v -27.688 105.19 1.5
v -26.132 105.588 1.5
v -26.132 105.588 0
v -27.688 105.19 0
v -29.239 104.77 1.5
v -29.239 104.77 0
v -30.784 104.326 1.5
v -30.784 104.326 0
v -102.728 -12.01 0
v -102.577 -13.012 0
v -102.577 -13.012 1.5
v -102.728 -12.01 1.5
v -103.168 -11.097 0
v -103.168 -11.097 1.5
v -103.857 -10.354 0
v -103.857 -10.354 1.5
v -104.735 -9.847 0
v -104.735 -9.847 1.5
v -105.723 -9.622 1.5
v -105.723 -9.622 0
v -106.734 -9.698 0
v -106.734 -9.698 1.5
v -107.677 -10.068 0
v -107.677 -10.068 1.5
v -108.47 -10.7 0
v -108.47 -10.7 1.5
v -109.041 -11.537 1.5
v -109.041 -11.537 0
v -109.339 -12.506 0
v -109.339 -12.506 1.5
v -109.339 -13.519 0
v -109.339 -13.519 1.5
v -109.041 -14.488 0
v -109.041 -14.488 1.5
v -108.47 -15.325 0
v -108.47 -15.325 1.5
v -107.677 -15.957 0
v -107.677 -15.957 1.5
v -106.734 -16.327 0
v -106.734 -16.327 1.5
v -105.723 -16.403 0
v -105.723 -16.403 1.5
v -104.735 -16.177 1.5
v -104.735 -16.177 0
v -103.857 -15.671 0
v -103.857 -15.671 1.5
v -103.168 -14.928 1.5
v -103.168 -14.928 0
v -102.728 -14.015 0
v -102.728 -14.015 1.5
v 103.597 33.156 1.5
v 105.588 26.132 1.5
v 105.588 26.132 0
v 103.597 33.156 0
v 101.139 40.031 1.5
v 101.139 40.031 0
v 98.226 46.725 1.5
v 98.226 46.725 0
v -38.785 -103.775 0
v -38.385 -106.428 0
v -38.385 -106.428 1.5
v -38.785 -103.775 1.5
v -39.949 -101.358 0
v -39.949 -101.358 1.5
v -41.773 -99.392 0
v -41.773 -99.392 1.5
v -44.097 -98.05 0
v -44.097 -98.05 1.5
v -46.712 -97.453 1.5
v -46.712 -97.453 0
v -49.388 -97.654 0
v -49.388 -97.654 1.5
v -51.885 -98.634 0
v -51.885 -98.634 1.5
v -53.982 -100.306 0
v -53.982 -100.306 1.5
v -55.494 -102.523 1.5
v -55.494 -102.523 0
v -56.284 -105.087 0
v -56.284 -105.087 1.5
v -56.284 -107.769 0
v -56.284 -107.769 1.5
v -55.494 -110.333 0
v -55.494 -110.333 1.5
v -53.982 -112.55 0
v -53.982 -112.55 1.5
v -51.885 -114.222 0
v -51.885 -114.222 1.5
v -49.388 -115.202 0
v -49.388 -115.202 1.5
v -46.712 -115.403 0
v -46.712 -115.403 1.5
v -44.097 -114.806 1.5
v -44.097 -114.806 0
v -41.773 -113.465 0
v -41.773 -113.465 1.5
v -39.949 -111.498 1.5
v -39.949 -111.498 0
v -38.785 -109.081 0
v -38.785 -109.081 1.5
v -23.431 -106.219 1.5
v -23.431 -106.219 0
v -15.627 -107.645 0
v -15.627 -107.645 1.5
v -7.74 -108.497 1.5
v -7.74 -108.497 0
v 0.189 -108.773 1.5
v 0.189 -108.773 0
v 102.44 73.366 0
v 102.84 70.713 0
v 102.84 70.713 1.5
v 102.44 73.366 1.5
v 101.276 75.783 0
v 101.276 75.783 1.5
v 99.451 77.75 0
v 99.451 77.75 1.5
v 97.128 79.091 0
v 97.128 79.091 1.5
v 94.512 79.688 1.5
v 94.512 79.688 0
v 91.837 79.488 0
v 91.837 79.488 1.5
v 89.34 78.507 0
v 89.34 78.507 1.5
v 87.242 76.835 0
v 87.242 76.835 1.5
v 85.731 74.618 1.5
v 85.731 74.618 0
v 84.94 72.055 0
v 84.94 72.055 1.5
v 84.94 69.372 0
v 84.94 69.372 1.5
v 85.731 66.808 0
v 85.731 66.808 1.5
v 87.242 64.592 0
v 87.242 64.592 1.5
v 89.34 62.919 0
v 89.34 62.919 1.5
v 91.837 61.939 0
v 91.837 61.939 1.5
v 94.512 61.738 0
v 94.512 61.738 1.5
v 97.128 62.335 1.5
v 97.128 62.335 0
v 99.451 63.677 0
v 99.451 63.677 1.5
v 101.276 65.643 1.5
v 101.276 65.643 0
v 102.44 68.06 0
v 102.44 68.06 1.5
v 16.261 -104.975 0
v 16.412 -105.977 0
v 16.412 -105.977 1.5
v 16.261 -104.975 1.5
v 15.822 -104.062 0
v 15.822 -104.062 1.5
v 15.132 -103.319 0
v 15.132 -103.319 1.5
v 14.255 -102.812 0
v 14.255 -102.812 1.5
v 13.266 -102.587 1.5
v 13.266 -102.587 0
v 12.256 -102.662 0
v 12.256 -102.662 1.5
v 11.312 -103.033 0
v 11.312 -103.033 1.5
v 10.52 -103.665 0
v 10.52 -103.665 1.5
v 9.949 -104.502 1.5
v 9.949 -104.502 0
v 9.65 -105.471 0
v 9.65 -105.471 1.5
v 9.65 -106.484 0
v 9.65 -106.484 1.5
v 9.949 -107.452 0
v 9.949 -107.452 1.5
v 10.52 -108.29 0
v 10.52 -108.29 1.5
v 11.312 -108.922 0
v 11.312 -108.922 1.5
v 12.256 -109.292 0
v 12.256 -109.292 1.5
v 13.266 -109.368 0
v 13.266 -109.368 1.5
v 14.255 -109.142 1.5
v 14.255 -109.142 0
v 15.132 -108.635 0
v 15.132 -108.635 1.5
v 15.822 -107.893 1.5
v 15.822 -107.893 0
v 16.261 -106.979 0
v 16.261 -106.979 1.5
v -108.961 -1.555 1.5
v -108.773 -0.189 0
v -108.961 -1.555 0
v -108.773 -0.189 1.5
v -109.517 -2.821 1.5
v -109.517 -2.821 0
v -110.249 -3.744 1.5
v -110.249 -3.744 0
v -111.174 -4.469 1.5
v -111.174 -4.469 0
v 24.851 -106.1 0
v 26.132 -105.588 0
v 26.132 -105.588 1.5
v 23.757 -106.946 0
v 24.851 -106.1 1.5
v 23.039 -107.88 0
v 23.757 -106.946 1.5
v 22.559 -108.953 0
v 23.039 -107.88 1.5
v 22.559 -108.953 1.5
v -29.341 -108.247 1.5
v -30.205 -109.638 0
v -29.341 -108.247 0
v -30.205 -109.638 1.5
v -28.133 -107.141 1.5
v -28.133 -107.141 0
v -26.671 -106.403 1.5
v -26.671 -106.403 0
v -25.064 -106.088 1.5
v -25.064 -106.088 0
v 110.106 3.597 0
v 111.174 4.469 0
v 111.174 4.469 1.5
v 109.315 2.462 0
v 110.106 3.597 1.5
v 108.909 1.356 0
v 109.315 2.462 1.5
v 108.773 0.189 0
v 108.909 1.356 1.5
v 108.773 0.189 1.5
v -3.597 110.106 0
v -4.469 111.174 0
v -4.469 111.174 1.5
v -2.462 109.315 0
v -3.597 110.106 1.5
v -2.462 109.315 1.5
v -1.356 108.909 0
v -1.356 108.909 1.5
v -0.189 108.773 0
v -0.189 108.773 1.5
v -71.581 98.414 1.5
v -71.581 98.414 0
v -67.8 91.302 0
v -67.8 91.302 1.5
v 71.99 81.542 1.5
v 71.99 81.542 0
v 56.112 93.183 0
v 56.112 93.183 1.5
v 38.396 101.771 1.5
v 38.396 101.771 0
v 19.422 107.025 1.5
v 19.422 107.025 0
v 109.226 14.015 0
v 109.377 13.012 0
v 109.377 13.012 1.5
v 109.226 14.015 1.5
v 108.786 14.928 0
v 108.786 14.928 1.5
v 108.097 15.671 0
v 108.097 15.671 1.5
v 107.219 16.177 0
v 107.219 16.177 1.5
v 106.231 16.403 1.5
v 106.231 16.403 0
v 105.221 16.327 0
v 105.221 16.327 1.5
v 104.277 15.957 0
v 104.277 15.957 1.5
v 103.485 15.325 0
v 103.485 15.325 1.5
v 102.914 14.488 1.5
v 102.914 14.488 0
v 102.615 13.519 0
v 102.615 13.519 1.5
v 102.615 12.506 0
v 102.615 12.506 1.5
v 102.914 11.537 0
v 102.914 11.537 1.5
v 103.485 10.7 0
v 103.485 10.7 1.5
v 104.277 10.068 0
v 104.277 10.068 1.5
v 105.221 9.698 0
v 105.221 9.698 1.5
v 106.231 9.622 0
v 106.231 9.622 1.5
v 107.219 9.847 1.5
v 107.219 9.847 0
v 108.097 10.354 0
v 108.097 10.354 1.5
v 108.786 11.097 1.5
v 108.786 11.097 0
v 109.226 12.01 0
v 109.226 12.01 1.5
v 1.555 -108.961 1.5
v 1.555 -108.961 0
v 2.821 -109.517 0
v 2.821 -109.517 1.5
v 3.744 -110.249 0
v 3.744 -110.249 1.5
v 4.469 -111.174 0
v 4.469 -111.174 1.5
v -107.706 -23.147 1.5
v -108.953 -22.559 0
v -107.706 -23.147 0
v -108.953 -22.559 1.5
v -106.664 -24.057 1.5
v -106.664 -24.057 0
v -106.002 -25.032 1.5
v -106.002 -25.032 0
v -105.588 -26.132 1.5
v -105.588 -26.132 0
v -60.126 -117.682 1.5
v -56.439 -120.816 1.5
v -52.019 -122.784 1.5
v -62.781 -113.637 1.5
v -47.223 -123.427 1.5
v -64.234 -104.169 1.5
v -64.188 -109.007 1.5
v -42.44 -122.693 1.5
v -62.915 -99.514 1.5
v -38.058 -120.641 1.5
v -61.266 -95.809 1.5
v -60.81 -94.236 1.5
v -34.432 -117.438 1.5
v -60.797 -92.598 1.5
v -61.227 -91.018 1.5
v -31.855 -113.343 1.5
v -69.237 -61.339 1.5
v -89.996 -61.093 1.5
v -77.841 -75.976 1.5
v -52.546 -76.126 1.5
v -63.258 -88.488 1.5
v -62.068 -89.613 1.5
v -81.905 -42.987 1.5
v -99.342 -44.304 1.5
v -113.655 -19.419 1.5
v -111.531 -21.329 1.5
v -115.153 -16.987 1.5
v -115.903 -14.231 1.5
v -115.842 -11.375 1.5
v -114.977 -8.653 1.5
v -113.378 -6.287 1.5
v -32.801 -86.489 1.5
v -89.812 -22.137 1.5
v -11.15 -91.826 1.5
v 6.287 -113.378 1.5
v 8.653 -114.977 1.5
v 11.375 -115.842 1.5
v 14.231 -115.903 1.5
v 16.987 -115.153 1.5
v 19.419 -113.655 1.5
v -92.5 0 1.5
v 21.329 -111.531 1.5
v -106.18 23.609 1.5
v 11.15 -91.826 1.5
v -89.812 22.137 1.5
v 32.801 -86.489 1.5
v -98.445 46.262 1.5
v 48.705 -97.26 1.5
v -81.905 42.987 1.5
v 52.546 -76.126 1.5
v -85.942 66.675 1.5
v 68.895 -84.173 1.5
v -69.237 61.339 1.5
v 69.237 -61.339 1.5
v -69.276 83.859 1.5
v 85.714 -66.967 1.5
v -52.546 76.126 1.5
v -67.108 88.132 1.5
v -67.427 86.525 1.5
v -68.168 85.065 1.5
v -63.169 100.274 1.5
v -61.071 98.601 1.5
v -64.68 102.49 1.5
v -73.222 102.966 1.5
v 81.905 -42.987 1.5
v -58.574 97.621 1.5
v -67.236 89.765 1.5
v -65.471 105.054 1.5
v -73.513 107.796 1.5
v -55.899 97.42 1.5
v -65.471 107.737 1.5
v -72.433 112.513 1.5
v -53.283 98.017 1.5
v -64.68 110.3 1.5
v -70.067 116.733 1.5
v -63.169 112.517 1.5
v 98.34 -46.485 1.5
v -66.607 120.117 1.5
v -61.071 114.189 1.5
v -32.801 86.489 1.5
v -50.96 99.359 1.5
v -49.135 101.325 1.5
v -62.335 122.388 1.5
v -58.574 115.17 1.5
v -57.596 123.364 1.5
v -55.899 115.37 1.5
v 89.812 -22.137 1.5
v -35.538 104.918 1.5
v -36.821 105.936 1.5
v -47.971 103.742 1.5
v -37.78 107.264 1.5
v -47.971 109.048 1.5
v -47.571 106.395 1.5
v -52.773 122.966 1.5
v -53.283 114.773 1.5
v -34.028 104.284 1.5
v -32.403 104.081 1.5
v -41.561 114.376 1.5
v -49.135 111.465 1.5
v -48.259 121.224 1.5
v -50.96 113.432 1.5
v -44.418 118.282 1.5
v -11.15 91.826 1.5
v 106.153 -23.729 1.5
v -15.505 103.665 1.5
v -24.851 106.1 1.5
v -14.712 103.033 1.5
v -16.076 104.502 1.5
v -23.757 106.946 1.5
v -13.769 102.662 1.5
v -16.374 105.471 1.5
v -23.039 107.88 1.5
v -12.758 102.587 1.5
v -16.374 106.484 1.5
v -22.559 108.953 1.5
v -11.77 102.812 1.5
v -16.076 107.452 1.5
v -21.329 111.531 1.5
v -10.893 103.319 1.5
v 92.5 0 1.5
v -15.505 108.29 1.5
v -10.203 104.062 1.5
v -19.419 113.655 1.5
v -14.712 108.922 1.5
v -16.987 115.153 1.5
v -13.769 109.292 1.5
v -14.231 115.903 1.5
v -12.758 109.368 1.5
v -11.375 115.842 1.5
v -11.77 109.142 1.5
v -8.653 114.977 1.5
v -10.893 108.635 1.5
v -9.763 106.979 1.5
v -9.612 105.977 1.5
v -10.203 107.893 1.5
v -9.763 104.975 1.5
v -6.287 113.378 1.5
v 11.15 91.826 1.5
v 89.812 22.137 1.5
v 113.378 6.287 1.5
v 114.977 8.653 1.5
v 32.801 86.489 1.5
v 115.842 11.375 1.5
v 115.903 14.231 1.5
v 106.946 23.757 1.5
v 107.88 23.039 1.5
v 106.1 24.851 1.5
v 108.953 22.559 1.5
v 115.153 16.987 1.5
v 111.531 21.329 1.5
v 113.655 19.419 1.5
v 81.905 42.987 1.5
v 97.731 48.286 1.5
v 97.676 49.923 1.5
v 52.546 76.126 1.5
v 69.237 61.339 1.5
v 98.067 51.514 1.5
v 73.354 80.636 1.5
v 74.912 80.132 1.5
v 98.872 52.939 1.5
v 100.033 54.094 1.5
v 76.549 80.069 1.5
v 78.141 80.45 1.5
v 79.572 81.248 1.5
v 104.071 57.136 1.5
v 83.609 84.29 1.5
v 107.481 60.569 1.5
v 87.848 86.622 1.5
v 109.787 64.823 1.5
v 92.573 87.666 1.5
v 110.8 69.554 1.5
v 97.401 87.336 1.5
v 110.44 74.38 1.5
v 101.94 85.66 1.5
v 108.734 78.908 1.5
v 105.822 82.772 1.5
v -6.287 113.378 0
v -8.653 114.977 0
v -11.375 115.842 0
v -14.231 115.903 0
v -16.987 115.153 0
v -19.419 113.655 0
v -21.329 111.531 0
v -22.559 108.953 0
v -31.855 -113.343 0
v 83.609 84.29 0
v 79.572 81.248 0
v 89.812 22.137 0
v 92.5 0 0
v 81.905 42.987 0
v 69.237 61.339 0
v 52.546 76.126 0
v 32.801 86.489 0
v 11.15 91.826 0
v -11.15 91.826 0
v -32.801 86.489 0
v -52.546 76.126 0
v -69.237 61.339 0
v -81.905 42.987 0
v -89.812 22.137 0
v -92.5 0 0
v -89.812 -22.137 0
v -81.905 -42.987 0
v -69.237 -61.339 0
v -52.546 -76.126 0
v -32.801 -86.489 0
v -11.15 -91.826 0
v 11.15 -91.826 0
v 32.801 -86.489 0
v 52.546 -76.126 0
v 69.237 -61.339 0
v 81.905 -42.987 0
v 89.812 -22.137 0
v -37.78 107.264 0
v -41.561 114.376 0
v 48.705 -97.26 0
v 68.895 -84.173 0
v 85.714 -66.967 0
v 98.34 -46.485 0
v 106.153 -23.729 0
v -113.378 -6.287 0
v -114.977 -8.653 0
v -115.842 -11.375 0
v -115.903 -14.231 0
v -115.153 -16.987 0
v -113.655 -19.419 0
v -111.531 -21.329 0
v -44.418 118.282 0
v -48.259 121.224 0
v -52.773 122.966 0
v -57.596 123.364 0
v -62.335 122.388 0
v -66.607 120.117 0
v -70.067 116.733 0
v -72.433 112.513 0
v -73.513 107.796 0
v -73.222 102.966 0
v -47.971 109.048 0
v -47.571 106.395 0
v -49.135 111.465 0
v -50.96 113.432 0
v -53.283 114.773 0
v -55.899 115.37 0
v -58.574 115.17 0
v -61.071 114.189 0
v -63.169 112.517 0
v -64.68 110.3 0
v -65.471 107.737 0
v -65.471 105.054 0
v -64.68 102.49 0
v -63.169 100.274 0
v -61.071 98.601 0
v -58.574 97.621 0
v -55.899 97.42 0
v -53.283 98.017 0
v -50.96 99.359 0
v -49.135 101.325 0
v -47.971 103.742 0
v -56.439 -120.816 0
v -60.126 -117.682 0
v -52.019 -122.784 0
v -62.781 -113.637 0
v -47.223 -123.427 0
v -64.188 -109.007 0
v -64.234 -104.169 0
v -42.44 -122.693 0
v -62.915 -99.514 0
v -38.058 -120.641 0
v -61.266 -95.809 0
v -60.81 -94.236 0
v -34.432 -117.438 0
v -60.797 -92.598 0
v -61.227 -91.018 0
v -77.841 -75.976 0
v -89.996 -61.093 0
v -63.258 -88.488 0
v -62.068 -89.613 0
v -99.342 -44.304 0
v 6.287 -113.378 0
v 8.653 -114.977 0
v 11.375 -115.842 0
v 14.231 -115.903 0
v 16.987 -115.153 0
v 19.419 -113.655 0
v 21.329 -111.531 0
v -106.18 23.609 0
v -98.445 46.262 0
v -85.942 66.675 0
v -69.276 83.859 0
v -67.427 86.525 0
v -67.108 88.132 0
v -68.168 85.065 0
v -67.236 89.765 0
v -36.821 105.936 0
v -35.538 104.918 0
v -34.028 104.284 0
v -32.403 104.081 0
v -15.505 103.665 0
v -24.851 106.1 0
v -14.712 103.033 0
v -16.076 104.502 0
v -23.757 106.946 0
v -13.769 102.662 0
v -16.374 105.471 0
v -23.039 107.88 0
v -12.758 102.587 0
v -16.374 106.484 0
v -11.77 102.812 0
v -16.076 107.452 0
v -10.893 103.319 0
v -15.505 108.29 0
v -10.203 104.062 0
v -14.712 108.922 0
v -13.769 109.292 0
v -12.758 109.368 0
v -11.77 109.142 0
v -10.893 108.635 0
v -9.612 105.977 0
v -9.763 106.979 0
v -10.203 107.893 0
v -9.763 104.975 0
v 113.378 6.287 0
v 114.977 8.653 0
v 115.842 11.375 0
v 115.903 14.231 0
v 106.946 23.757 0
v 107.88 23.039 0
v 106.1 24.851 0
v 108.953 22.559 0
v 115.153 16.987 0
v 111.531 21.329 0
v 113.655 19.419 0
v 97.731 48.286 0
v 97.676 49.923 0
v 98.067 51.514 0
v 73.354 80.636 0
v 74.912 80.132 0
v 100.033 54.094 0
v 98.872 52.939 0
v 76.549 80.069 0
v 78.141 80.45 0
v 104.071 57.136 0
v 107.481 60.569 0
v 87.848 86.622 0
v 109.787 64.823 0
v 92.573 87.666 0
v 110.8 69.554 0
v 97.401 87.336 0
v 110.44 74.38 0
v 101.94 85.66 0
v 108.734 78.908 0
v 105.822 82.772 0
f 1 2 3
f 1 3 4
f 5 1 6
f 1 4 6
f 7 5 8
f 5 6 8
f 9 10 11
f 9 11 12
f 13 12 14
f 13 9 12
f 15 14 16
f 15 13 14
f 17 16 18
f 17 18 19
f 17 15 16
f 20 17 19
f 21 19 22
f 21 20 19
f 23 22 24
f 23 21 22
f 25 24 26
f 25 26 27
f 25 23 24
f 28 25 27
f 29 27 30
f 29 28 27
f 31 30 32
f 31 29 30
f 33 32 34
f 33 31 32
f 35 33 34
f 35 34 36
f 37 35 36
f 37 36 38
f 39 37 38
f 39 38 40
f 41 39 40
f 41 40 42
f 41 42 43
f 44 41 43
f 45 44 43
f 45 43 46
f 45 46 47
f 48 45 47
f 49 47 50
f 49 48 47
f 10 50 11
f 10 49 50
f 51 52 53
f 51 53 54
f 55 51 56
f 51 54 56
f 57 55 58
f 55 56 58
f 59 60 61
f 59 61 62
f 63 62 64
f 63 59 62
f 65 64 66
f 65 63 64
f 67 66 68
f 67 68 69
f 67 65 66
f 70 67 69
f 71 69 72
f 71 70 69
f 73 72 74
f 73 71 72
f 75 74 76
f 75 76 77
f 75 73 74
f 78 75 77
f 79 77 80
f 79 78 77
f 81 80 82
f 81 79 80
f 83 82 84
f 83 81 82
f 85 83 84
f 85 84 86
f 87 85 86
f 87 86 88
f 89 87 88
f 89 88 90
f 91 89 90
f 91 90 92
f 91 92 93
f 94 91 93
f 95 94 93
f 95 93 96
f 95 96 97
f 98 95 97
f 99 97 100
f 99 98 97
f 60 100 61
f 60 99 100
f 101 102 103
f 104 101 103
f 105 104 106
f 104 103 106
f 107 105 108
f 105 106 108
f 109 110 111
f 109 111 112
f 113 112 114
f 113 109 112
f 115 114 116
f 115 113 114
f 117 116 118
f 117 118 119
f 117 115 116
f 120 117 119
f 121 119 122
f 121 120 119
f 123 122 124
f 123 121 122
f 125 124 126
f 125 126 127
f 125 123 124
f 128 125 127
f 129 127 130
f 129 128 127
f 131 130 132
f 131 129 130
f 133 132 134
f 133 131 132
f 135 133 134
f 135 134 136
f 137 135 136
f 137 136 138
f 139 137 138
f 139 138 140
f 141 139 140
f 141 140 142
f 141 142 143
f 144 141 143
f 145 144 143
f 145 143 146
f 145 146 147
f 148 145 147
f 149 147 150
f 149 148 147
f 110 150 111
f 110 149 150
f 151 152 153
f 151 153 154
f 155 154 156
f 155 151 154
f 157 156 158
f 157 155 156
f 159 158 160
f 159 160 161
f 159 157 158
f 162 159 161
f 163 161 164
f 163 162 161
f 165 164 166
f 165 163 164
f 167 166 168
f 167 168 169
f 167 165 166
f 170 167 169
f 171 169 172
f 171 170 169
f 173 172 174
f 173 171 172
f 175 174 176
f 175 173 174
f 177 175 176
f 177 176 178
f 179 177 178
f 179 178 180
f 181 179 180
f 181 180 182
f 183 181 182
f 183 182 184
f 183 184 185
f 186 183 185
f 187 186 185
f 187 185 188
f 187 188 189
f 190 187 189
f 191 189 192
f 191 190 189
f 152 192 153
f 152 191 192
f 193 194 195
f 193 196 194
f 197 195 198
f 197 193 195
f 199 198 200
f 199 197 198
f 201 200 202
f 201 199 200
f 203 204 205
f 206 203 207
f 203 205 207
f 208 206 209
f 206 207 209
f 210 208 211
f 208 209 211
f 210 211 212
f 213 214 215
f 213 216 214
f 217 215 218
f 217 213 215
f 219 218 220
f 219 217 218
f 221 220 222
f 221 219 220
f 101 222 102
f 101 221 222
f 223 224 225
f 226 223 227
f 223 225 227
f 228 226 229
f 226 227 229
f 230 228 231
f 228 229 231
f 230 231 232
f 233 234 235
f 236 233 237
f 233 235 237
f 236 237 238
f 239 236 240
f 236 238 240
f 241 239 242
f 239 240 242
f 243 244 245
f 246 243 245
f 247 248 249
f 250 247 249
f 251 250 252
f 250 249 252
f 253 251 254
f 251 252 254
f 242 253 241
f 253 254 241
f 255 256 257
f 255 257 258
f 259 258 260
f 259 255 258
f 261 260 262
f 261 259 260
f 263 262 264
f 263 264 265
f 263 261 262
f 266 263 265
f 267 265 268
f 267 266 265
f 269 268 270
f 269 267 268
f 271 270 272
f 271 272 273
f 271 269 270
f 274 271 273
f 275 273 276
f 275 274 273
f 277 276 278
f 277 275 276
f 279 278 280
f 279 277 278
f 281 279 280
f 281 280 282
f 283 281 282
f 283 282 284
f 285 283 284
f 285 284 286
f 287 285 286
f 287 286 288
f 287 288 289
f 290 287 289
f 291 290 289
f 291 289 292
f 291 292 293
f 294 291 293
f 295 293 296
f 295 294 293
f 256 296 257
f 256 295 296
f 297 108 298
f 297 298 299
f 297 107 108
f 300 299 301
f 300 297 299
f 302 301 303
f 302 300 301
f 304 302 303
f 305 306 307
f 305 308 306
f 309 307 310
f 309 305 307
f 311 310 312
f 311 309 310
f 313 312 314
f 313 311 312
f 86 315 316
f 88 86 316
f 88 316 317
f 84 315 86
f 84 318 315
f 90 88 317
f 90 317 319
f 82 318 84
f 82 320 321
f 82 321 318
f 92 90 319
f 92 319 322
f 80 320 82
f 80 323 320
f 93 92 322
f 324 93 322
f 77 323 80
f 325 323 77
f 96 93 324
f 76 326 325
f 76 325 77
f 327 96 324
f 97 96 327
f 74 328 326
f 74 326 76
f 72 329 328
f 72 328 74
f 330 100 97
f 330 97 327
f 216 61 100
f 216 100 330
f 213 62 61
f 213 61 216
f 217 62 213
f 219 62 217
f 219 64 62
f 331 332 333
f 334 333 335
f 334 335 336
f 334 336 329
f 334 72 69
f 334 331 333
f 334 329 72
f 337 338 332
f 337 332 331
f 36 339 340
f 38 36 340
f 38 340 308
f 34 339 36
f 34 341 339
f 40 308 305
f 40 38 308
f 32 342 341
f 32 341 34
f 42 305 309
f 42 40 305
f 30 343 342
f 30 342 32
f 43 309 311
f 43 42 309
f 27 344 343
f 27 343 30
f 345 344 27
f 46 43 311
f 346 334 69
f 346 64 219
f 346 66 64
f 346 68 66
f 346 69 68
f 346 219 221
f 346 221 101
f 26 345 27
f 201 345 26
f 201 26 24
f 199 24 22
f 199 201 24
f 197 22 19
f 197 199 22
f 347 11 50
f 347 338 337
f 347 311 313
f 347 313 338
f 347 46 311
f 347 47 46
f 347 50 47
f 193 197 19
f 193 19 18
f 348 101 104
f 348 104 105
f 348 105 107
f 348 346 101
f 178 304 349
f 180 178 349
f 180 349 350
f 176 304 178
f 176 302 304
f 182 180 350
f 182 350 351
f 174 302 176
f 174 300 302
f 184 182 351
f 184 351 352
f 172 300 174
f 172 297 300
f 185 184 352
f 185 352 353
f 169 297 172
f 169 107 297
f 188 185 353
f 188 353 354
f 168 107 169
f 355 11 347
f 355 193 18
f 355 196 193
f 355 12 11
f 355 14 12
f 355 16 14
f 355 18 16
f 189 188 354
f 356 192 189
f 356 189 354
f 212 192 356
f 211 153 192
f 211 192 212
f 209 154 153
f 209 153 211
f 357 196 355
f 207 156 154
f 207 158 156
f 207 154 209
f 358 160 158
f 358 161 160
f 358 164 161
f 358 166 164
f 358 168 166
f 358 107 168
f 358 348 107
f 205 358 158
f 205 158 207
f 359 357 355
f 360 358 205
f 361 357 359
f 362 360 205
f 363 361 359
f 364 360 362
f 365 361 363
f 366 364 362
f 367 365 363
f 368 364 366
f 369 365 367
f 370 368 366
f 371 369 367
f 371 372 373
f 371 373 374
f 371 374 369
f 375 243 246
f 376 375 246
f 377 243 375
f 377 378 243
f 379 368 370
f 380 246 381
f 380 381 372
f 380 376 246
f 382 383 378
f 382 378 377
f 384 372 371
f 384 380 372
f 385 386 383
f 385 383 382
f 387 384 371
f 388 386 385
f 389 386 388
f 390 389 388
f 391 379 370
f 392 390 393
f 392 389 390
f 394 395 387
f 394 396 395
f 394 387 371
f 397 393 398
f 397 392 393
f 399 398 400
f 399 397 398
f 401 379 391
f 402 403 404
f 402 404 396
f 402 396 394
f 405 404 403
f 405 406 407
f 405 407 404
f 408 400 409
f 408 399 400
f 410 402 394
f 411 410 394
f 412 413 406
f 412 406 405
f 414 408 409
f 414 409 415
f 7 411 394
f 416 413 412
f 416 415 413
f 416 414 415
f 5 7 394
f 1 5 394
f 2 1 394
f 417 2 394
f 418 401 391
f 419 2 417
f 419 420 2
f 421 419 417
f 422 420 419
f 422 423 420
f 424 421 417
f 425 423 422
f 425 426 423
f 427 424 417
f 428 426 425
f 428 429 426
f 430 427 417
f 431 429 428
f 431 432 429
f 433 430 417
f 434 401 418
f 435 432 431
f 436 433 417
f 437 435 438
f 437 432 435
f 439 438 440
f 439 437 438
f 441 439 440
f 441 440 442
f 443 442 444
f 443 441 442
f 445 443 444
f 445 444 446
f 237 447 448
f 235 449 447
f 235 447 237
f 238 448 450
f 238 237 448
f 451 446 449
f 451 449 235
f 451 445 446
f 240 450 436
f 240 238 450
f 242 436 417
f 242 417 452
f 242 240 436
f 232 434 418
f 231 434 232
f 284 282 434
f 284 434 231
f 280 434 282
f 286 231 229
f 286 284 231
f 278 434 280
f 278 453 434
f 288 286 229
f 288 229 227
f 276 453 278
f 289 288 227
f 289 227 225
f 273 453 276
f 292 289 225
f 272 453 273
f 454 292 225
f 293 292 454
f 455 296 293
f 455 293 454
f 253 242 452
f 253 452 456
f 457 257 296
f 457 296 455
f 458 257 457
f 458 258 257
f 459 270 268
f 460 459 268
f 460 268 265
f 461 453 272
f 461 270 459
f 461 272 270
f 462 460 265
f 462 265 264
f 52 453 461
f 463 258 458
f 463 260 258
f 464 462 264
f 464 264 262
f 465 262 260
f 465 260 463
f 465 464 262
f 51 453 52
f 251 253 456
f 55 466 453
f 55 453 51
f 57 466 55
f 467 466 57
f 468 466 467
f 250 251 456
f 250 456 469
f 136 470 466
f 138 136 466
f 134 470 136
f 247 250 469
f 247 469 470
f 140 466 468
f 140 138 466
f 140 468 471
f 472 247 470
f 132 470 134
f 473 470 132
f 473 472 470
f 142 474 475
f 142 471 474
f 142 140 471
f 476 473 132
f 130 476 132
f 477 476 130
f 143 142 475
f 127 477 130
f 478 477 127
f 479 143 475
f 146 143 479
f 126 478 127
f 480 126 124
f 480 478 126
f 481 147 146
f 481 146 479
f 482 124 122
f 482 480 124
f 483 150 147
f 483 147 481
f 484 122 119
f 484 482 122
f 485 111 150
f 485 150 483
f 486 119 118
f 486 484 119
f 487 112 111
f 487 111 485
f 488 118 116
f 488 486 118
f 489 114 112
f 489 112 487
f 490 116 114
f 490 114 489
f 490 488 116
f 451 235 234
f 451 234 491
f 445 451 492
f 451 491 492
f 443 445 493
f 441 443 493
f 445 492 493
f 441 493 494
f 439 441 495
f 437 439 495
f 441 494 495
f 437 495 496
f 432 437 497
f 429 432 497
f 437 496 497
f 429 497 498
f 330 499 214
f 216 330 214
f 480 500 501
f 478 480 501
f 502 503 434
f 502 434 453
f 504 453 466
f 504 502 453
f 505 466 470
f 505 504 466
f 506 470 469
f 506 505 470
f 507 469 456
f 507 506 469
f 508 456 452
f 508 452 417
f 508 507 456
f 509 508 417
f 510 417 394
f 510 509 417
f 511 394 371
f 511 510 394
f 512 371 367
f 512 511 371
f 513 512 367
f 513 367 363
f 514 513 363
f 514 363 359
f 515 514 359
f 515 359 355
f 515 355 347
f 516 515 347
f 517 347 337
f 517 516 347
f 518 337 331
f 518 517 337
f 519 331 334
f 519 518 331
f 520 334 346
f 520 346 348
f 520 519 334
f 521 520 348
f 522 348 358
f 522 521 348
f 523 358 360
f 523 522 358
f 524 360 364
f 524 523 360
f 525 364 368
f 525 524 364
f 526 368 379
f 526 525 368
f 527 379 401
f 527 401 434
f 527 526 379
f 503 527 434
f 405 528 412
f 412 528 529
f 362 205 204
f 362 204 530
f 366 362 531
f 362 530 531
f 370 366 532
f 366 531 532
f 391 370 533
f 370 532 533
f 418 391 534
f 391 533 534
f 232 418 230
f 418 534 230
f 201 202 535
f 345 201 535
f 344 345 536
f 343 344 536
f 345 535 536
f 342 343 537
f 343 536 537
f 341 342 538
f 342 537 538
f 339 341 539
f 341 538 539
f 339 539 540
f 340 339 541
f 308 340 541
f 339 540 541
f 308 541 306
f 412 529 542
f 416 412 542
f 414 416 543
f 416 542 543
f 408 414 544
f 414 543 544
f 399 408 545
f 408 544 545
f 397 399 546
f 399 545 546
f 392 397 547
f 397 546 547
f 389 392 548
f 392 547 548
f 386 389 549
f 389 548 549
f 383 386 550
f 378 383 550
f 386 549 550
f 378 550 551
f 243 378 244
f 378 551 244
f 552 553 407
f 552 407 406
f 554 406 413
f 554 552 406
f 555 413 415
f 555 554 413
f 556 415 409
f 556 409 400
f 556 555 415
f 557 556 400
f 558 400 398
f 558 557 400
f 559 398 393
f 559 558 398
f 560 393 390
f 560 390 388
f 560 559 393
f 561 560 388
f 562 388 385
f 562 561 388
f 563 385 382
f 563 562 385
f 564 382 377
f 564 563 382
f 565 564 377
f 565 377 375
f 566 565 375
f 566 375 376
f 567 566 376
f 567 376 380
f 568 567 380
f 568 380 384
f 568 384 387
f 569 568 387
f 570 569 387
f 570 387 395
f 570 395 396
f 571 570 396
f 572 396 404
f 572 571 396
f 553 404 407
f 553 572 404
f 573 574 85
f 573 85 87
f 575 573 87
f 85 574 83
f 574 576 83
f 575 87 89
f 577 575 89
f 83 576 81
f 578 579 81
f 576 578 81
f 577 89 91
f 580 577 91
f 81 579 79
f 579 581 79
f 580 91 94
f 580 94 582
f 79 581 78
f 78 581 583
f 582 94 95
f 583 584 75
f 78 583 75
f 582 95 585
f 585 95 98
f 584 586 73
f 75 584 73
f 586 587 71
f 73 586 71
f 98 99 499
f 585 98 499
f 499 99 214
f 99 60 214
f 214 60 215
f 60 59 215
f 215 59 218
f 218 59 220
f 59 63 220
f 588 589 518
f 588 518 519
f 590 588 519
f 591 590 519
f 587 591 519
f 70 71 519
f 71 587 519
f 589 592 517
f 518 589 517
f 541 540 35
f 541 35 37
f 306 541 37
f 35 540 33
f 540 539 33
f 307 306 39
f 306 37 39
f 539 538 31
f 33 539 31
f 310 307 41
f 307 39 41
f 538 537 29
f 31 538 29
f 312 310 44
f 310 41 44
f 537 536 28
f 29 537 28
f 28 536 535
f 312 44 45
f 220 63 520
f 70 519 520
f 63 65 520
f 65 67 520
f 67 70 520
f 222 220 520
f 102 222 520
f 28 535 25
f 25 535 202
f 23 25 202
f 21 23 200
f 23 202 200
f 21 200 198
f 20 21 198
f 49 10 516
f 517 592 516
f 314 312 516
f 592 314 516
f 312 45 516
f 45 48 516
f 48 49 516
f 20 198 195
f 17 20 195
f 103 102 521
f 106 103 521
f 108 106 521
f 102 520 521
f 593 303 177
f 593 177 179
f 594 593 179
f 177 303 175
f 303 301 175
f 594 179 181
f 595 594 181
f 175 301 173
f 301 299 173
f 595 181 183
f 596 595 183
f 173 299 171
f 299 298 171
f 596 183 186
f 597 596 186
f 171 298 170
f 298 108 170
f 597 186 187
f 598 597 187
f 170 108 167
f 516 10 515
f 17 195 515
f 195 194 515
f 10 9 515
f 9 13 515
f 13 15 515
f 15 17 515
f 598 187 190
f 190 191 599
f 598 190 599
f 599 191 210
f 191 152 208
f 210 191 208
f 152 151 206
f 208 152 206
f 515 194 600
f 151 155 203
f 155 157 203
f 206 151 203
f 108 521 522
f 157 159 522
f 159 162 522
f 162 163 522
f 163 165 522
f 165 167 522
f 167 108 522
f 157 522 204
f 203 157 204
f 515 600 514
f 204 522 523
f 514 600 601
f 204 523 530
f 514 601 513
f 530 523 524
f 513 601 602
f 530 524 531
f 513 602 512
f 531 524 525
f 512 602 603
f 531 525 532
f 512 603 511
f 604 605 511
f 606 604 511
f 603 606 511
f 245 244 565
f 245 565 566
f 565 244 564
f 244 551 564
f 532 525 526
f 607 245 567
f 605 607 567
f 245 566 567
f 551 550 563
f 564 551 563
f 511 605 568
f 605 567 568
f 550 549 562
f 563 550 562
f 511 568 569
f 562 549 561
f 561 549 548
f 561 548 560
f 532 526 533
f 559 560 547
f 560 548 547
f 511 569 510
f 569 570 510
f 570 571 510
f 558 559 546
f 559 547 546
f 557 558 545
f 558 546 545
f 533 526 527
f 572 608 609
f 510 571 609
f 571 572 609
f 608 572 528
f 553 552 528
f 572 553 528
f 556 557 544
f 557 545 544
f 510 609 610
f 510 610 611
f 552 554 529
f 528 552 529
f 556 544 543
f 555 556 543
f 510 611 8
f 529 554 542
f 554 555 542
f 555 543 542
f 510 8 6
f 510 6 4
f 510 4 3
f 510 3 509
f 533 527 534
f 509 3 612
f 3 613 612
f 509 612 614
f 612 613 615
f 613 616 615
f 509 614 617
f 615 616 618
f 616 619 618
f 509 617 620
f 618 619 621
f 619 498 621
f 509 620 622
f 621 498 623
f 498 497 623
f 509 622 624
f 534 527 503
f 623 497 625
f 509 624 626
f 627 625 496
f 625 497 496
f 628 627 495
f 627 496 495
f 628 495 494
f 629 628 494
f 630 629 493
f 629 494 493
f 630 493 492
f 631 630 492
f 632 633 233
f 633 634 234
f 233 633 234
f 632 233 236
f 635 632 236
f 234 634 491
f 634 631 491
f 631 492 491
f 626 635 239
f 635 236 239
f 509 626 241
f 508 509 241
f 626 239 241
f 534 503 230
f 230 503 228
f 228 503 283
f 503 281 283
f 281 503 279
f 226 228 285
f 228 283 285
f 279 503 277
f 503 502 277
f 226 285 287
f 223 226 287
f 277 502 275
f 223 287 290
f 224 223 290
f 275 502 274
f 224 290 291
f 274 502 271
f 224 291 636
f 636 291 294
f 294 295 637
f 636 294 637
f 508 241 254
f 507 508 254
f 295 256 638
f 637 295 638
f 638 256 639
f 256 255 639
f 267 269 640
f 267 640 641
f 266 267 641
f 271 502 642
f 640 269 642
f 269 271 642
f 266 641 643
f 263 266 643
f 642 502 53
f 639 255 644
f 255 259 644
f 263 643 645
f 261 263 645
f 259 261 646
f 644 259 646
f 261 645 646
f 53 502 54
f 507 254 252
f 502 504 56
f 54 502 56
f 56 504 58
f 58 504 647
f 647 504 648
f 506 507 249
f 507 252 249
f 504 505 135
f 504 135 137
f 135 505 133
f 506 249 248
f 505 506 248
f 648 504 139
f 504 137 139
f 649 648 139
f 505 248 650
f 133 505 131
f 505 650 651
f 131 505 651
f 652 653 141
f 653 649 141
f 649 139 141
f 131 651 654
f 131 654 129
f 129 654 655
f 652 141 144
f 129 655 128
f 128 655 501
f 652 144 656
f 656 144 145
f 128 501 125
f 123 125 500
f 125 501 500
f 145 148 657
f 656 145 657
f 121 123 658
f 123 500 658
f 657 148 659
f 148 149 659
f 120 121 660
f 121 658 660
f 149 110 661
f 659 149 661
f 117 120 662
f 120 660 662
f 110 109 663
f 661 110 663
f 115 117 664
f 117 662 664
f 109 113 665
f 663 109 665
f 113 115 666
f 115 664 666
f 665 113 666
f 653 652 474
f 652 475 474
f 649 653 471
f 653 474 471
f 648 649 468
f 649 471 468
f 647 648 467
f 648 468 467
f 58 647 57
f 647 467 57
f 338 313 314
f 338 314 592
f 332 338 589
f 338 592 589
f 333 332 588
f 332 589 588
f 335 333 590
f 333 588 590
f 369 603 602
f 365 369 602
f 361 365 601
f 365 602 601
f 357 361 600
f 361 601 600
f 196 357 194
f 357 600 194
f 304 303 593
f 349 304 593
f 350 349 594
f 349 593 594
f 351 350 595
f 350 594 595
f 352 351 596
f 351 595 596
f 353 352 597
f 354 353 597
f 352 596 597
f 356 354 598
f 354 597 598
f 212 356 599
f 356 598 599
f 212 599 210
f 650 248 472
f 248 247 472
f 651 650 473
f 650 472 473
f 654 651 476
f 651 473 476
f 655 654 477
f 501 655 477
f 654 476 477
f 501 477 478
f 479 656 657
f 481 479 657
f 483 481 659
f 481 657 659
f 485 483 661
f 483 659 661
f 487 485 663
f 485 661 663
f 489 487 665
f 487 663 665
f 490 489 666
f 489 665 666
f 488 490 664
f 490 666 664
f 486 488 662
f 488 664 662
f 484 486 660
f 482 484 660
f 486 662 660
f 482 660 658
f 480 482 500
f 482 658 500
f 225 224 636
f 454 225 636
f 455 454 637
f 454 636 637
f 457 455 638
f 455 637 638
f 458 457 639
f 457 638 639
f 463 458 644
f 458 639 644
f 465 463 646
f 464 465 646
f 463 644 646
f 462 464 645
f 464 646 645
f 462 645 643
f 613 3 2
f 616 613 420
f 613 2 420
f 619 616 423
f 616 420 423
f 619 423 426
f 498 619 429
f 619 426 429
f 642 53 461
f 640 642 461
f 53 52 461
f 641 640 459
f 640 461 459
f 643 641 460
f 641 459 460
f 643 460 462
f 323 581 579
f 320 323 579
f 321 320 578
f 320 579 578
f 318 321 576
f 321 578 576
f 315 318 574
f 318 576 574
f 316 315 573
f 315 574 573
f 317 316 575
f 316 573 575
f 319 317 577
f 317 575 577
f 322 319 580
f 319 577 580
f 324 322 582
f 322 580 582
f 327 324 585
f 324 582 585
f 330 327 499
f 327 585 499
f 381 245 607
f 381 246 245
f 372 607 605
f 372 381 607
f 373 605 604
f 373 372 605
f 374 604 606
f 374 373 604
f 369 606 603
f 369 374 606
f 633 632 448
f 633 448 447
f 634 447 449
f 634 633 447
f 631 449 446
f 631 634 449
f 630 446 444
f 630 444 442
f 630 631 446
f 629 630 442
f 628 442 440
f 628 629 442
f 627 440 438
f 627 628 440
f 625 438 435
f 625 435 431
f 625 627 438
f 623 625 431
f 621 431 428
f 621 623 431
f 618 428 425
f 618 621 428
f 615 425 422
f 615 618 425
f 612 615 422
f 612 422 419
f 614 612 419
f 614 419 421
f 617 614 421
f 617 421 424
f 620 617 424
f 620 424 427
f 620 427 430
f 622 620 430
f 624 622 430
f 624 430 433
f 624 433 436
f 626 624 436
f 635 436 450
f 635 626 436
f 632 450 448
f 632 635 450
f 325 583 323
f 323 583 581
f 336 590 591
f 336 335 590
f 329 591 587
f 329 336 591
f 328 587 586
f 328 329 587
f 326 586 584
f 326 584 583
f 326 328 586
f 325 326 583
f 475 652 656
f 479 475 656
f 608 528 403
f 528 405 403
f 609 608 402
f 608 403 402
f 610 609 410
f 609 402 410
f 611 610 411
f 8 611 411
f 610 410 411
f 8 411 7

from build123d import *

# Parameters (mm, degrees)
F0_R     = 9
F0_R_2   = 3.4
F0_R_3   = 92.5
F1_DEPTH = 1.5
F2_R     = 6
F3_R     = 5


# Not quite as in the source:
# - a feature names something its author has since deleted; it is built from what else it names


with BuildPart() as f1:
    # F0 (on Top) → F1 (new body)
    with BuildSketch(Plane.XY):
        with BuildLine():
            ThreePointArc((-41.5612142371, 114.3762015069), (-64.5523398831, 121.4052940181), (-71.5814323943, 98.4141683721))
            Line((-71.5814323943, 98.4141683721), (-65.4484708904, 86.8797453608))
            ThreePointArc((-65.4484708904, 86.8797453608), (-98.0871820311, 47.0159251428), (-108.7201014418, -3.3958854983))
            ThreePointArc((-108.7201014418, -3.3958854983), (-115.9027148008, -14.2310639443), (-106.3121888463, -23.0067598447))
            ThreePointArc((-106.3121888463, -23.0067598447), (-89.5246549559, -61.7812969341), (-59.2286170286, -91.2335652089))
            Line((-59.2286170286, -91.2335652089), (-62.9150916983, -99.5135228831))
            ThreePointArc((-62.9150916983, -99.5135228831), (-54.2993418506, -121.9583185953), (-31.8545461384, -113.3425687477))
            Line((-31.8545461384, -113.3425687477), (-28.1680714687, -105.0626110734))
            ThreePointArc((-28.1680714687, -105.0626110734), (-12.5203677417, -108.0501406174), (3.3958854983, -108.7201014418))
            ThreePointArc((3.3958854983, -108.7201014418), (14.2310639443, -115.9027148008), (23.0067598447, -106.3121888463))
            ThreePointArc((23.0067598447, -106.3121888463), (85.7143913832, -66.9674219725), (108.7201014418, 3.3958854983))
            ThreePointArc((108.7201014418, 3.3958854983), (115.9027148008, 14.2310639443), (106.3121888463, 23.0067598447))
            ThreePointArc((106.3121888463, 23.0067598447), (102.1418848281, 37.3982333755), (96.0334257824, 51.0800707549))
            Line((96.0334257824, 51.0800707549), (104.0705278241, 57.1364615496))
            ThreePointArc((104.0705278241, 57.1364615496), (107.4164761014, 80.944120614), (83.608817037, 84.2900688912))
            Line((83.608817037, 84.2900688912), (75.5717149953, 78.2336780965))
            ThreePointArc((75.5717149953, 78.2336780965), (39.1751591317, 101.4736389554), (-3.3958854983, 108.7201014418))
            ThreePointArc((-3.3958854983, 108.7201014418), (-14.2310639443, 115.9027148008), (-23.0067598447, 106.3121888463))
            ThreePointArc((-23.0067598447, 106.3121888463), (-29.2689871835, 104.7612470577), (-35.4282527332, 102.8417784955))
            Line((-35.4282527332, 102.8417784955), (-41.5612142371, 114.3762015069))
        make_face()
        with Locations((-47.3848189183, -106.4280458154)):
            Circle(F0_R, mode=Mode.SUBTRACT)
        with Locations((-105.9772532844, -13.0123705102)):
            Circle(F0_R_2, mode=Mode.SUBTRACT)
        with Locations((13.0123705102, -105.9772532844)):
            Circle(F0_R_2, mode=Mode.SUBTRACT)
        Circle(F0_R_3, mode=Mode.SUBTRACT)
        with Locations((-56.5713233157, 106.3951849395)):
            Circle(F0_R, mode=Mode.SUBTRACT)
        with Locations((-13.0123705102, 105.9772532844)):
            Circle(F0_R_2, mode=Mode.SUBTRACT)
        with Locations((105.9772532844, 13.0123705102)):
            Circle(F0_R_2, mode=Mode.SUBTRACT)
        with Locations((93.8396724306, 70.7132652204)):
            Circle(F0_R, mode=Mode.SUBTRACT)
    extrude(amount=F1_DEPTH)

    # F2
    f2_edges = [f1.edges().sort_by_distance(p)[0] for p in [
        (-65.448471, 86.879745, 0.75),
        (-59.228617, -91.233565, 0.75),
        (-28.168071, -105.062611, 0.75),
        (96.033426, 51.080071, 0.75),
        (75.571715, 78.233678, 0.75),
        (-35.428253, 102.841778, 0.75),
    ]]
    fillet(f2_edges, radius=F2_R)

    # F3
    f3_edges = [f1.edges().sort_by_distance(p)[0] for p in [
        (-108.720101, -3.395885, 0.75),
        (-106.312189, -23.00676, 0.75),
        (-23.00676, 106.312189, 0.75),
        (-3.395885, 108.720101, 0.75),
        (3.395885, -108.720101, 0.75),
        (23.00676, -106.312189, 0.75),
        (108.720101, 3.395885, 0.75),
        (106.312189, 23.00676, 0.75),
    ]]
    fillet(f3_edges, radius=F3_R)


solid = f1.part
